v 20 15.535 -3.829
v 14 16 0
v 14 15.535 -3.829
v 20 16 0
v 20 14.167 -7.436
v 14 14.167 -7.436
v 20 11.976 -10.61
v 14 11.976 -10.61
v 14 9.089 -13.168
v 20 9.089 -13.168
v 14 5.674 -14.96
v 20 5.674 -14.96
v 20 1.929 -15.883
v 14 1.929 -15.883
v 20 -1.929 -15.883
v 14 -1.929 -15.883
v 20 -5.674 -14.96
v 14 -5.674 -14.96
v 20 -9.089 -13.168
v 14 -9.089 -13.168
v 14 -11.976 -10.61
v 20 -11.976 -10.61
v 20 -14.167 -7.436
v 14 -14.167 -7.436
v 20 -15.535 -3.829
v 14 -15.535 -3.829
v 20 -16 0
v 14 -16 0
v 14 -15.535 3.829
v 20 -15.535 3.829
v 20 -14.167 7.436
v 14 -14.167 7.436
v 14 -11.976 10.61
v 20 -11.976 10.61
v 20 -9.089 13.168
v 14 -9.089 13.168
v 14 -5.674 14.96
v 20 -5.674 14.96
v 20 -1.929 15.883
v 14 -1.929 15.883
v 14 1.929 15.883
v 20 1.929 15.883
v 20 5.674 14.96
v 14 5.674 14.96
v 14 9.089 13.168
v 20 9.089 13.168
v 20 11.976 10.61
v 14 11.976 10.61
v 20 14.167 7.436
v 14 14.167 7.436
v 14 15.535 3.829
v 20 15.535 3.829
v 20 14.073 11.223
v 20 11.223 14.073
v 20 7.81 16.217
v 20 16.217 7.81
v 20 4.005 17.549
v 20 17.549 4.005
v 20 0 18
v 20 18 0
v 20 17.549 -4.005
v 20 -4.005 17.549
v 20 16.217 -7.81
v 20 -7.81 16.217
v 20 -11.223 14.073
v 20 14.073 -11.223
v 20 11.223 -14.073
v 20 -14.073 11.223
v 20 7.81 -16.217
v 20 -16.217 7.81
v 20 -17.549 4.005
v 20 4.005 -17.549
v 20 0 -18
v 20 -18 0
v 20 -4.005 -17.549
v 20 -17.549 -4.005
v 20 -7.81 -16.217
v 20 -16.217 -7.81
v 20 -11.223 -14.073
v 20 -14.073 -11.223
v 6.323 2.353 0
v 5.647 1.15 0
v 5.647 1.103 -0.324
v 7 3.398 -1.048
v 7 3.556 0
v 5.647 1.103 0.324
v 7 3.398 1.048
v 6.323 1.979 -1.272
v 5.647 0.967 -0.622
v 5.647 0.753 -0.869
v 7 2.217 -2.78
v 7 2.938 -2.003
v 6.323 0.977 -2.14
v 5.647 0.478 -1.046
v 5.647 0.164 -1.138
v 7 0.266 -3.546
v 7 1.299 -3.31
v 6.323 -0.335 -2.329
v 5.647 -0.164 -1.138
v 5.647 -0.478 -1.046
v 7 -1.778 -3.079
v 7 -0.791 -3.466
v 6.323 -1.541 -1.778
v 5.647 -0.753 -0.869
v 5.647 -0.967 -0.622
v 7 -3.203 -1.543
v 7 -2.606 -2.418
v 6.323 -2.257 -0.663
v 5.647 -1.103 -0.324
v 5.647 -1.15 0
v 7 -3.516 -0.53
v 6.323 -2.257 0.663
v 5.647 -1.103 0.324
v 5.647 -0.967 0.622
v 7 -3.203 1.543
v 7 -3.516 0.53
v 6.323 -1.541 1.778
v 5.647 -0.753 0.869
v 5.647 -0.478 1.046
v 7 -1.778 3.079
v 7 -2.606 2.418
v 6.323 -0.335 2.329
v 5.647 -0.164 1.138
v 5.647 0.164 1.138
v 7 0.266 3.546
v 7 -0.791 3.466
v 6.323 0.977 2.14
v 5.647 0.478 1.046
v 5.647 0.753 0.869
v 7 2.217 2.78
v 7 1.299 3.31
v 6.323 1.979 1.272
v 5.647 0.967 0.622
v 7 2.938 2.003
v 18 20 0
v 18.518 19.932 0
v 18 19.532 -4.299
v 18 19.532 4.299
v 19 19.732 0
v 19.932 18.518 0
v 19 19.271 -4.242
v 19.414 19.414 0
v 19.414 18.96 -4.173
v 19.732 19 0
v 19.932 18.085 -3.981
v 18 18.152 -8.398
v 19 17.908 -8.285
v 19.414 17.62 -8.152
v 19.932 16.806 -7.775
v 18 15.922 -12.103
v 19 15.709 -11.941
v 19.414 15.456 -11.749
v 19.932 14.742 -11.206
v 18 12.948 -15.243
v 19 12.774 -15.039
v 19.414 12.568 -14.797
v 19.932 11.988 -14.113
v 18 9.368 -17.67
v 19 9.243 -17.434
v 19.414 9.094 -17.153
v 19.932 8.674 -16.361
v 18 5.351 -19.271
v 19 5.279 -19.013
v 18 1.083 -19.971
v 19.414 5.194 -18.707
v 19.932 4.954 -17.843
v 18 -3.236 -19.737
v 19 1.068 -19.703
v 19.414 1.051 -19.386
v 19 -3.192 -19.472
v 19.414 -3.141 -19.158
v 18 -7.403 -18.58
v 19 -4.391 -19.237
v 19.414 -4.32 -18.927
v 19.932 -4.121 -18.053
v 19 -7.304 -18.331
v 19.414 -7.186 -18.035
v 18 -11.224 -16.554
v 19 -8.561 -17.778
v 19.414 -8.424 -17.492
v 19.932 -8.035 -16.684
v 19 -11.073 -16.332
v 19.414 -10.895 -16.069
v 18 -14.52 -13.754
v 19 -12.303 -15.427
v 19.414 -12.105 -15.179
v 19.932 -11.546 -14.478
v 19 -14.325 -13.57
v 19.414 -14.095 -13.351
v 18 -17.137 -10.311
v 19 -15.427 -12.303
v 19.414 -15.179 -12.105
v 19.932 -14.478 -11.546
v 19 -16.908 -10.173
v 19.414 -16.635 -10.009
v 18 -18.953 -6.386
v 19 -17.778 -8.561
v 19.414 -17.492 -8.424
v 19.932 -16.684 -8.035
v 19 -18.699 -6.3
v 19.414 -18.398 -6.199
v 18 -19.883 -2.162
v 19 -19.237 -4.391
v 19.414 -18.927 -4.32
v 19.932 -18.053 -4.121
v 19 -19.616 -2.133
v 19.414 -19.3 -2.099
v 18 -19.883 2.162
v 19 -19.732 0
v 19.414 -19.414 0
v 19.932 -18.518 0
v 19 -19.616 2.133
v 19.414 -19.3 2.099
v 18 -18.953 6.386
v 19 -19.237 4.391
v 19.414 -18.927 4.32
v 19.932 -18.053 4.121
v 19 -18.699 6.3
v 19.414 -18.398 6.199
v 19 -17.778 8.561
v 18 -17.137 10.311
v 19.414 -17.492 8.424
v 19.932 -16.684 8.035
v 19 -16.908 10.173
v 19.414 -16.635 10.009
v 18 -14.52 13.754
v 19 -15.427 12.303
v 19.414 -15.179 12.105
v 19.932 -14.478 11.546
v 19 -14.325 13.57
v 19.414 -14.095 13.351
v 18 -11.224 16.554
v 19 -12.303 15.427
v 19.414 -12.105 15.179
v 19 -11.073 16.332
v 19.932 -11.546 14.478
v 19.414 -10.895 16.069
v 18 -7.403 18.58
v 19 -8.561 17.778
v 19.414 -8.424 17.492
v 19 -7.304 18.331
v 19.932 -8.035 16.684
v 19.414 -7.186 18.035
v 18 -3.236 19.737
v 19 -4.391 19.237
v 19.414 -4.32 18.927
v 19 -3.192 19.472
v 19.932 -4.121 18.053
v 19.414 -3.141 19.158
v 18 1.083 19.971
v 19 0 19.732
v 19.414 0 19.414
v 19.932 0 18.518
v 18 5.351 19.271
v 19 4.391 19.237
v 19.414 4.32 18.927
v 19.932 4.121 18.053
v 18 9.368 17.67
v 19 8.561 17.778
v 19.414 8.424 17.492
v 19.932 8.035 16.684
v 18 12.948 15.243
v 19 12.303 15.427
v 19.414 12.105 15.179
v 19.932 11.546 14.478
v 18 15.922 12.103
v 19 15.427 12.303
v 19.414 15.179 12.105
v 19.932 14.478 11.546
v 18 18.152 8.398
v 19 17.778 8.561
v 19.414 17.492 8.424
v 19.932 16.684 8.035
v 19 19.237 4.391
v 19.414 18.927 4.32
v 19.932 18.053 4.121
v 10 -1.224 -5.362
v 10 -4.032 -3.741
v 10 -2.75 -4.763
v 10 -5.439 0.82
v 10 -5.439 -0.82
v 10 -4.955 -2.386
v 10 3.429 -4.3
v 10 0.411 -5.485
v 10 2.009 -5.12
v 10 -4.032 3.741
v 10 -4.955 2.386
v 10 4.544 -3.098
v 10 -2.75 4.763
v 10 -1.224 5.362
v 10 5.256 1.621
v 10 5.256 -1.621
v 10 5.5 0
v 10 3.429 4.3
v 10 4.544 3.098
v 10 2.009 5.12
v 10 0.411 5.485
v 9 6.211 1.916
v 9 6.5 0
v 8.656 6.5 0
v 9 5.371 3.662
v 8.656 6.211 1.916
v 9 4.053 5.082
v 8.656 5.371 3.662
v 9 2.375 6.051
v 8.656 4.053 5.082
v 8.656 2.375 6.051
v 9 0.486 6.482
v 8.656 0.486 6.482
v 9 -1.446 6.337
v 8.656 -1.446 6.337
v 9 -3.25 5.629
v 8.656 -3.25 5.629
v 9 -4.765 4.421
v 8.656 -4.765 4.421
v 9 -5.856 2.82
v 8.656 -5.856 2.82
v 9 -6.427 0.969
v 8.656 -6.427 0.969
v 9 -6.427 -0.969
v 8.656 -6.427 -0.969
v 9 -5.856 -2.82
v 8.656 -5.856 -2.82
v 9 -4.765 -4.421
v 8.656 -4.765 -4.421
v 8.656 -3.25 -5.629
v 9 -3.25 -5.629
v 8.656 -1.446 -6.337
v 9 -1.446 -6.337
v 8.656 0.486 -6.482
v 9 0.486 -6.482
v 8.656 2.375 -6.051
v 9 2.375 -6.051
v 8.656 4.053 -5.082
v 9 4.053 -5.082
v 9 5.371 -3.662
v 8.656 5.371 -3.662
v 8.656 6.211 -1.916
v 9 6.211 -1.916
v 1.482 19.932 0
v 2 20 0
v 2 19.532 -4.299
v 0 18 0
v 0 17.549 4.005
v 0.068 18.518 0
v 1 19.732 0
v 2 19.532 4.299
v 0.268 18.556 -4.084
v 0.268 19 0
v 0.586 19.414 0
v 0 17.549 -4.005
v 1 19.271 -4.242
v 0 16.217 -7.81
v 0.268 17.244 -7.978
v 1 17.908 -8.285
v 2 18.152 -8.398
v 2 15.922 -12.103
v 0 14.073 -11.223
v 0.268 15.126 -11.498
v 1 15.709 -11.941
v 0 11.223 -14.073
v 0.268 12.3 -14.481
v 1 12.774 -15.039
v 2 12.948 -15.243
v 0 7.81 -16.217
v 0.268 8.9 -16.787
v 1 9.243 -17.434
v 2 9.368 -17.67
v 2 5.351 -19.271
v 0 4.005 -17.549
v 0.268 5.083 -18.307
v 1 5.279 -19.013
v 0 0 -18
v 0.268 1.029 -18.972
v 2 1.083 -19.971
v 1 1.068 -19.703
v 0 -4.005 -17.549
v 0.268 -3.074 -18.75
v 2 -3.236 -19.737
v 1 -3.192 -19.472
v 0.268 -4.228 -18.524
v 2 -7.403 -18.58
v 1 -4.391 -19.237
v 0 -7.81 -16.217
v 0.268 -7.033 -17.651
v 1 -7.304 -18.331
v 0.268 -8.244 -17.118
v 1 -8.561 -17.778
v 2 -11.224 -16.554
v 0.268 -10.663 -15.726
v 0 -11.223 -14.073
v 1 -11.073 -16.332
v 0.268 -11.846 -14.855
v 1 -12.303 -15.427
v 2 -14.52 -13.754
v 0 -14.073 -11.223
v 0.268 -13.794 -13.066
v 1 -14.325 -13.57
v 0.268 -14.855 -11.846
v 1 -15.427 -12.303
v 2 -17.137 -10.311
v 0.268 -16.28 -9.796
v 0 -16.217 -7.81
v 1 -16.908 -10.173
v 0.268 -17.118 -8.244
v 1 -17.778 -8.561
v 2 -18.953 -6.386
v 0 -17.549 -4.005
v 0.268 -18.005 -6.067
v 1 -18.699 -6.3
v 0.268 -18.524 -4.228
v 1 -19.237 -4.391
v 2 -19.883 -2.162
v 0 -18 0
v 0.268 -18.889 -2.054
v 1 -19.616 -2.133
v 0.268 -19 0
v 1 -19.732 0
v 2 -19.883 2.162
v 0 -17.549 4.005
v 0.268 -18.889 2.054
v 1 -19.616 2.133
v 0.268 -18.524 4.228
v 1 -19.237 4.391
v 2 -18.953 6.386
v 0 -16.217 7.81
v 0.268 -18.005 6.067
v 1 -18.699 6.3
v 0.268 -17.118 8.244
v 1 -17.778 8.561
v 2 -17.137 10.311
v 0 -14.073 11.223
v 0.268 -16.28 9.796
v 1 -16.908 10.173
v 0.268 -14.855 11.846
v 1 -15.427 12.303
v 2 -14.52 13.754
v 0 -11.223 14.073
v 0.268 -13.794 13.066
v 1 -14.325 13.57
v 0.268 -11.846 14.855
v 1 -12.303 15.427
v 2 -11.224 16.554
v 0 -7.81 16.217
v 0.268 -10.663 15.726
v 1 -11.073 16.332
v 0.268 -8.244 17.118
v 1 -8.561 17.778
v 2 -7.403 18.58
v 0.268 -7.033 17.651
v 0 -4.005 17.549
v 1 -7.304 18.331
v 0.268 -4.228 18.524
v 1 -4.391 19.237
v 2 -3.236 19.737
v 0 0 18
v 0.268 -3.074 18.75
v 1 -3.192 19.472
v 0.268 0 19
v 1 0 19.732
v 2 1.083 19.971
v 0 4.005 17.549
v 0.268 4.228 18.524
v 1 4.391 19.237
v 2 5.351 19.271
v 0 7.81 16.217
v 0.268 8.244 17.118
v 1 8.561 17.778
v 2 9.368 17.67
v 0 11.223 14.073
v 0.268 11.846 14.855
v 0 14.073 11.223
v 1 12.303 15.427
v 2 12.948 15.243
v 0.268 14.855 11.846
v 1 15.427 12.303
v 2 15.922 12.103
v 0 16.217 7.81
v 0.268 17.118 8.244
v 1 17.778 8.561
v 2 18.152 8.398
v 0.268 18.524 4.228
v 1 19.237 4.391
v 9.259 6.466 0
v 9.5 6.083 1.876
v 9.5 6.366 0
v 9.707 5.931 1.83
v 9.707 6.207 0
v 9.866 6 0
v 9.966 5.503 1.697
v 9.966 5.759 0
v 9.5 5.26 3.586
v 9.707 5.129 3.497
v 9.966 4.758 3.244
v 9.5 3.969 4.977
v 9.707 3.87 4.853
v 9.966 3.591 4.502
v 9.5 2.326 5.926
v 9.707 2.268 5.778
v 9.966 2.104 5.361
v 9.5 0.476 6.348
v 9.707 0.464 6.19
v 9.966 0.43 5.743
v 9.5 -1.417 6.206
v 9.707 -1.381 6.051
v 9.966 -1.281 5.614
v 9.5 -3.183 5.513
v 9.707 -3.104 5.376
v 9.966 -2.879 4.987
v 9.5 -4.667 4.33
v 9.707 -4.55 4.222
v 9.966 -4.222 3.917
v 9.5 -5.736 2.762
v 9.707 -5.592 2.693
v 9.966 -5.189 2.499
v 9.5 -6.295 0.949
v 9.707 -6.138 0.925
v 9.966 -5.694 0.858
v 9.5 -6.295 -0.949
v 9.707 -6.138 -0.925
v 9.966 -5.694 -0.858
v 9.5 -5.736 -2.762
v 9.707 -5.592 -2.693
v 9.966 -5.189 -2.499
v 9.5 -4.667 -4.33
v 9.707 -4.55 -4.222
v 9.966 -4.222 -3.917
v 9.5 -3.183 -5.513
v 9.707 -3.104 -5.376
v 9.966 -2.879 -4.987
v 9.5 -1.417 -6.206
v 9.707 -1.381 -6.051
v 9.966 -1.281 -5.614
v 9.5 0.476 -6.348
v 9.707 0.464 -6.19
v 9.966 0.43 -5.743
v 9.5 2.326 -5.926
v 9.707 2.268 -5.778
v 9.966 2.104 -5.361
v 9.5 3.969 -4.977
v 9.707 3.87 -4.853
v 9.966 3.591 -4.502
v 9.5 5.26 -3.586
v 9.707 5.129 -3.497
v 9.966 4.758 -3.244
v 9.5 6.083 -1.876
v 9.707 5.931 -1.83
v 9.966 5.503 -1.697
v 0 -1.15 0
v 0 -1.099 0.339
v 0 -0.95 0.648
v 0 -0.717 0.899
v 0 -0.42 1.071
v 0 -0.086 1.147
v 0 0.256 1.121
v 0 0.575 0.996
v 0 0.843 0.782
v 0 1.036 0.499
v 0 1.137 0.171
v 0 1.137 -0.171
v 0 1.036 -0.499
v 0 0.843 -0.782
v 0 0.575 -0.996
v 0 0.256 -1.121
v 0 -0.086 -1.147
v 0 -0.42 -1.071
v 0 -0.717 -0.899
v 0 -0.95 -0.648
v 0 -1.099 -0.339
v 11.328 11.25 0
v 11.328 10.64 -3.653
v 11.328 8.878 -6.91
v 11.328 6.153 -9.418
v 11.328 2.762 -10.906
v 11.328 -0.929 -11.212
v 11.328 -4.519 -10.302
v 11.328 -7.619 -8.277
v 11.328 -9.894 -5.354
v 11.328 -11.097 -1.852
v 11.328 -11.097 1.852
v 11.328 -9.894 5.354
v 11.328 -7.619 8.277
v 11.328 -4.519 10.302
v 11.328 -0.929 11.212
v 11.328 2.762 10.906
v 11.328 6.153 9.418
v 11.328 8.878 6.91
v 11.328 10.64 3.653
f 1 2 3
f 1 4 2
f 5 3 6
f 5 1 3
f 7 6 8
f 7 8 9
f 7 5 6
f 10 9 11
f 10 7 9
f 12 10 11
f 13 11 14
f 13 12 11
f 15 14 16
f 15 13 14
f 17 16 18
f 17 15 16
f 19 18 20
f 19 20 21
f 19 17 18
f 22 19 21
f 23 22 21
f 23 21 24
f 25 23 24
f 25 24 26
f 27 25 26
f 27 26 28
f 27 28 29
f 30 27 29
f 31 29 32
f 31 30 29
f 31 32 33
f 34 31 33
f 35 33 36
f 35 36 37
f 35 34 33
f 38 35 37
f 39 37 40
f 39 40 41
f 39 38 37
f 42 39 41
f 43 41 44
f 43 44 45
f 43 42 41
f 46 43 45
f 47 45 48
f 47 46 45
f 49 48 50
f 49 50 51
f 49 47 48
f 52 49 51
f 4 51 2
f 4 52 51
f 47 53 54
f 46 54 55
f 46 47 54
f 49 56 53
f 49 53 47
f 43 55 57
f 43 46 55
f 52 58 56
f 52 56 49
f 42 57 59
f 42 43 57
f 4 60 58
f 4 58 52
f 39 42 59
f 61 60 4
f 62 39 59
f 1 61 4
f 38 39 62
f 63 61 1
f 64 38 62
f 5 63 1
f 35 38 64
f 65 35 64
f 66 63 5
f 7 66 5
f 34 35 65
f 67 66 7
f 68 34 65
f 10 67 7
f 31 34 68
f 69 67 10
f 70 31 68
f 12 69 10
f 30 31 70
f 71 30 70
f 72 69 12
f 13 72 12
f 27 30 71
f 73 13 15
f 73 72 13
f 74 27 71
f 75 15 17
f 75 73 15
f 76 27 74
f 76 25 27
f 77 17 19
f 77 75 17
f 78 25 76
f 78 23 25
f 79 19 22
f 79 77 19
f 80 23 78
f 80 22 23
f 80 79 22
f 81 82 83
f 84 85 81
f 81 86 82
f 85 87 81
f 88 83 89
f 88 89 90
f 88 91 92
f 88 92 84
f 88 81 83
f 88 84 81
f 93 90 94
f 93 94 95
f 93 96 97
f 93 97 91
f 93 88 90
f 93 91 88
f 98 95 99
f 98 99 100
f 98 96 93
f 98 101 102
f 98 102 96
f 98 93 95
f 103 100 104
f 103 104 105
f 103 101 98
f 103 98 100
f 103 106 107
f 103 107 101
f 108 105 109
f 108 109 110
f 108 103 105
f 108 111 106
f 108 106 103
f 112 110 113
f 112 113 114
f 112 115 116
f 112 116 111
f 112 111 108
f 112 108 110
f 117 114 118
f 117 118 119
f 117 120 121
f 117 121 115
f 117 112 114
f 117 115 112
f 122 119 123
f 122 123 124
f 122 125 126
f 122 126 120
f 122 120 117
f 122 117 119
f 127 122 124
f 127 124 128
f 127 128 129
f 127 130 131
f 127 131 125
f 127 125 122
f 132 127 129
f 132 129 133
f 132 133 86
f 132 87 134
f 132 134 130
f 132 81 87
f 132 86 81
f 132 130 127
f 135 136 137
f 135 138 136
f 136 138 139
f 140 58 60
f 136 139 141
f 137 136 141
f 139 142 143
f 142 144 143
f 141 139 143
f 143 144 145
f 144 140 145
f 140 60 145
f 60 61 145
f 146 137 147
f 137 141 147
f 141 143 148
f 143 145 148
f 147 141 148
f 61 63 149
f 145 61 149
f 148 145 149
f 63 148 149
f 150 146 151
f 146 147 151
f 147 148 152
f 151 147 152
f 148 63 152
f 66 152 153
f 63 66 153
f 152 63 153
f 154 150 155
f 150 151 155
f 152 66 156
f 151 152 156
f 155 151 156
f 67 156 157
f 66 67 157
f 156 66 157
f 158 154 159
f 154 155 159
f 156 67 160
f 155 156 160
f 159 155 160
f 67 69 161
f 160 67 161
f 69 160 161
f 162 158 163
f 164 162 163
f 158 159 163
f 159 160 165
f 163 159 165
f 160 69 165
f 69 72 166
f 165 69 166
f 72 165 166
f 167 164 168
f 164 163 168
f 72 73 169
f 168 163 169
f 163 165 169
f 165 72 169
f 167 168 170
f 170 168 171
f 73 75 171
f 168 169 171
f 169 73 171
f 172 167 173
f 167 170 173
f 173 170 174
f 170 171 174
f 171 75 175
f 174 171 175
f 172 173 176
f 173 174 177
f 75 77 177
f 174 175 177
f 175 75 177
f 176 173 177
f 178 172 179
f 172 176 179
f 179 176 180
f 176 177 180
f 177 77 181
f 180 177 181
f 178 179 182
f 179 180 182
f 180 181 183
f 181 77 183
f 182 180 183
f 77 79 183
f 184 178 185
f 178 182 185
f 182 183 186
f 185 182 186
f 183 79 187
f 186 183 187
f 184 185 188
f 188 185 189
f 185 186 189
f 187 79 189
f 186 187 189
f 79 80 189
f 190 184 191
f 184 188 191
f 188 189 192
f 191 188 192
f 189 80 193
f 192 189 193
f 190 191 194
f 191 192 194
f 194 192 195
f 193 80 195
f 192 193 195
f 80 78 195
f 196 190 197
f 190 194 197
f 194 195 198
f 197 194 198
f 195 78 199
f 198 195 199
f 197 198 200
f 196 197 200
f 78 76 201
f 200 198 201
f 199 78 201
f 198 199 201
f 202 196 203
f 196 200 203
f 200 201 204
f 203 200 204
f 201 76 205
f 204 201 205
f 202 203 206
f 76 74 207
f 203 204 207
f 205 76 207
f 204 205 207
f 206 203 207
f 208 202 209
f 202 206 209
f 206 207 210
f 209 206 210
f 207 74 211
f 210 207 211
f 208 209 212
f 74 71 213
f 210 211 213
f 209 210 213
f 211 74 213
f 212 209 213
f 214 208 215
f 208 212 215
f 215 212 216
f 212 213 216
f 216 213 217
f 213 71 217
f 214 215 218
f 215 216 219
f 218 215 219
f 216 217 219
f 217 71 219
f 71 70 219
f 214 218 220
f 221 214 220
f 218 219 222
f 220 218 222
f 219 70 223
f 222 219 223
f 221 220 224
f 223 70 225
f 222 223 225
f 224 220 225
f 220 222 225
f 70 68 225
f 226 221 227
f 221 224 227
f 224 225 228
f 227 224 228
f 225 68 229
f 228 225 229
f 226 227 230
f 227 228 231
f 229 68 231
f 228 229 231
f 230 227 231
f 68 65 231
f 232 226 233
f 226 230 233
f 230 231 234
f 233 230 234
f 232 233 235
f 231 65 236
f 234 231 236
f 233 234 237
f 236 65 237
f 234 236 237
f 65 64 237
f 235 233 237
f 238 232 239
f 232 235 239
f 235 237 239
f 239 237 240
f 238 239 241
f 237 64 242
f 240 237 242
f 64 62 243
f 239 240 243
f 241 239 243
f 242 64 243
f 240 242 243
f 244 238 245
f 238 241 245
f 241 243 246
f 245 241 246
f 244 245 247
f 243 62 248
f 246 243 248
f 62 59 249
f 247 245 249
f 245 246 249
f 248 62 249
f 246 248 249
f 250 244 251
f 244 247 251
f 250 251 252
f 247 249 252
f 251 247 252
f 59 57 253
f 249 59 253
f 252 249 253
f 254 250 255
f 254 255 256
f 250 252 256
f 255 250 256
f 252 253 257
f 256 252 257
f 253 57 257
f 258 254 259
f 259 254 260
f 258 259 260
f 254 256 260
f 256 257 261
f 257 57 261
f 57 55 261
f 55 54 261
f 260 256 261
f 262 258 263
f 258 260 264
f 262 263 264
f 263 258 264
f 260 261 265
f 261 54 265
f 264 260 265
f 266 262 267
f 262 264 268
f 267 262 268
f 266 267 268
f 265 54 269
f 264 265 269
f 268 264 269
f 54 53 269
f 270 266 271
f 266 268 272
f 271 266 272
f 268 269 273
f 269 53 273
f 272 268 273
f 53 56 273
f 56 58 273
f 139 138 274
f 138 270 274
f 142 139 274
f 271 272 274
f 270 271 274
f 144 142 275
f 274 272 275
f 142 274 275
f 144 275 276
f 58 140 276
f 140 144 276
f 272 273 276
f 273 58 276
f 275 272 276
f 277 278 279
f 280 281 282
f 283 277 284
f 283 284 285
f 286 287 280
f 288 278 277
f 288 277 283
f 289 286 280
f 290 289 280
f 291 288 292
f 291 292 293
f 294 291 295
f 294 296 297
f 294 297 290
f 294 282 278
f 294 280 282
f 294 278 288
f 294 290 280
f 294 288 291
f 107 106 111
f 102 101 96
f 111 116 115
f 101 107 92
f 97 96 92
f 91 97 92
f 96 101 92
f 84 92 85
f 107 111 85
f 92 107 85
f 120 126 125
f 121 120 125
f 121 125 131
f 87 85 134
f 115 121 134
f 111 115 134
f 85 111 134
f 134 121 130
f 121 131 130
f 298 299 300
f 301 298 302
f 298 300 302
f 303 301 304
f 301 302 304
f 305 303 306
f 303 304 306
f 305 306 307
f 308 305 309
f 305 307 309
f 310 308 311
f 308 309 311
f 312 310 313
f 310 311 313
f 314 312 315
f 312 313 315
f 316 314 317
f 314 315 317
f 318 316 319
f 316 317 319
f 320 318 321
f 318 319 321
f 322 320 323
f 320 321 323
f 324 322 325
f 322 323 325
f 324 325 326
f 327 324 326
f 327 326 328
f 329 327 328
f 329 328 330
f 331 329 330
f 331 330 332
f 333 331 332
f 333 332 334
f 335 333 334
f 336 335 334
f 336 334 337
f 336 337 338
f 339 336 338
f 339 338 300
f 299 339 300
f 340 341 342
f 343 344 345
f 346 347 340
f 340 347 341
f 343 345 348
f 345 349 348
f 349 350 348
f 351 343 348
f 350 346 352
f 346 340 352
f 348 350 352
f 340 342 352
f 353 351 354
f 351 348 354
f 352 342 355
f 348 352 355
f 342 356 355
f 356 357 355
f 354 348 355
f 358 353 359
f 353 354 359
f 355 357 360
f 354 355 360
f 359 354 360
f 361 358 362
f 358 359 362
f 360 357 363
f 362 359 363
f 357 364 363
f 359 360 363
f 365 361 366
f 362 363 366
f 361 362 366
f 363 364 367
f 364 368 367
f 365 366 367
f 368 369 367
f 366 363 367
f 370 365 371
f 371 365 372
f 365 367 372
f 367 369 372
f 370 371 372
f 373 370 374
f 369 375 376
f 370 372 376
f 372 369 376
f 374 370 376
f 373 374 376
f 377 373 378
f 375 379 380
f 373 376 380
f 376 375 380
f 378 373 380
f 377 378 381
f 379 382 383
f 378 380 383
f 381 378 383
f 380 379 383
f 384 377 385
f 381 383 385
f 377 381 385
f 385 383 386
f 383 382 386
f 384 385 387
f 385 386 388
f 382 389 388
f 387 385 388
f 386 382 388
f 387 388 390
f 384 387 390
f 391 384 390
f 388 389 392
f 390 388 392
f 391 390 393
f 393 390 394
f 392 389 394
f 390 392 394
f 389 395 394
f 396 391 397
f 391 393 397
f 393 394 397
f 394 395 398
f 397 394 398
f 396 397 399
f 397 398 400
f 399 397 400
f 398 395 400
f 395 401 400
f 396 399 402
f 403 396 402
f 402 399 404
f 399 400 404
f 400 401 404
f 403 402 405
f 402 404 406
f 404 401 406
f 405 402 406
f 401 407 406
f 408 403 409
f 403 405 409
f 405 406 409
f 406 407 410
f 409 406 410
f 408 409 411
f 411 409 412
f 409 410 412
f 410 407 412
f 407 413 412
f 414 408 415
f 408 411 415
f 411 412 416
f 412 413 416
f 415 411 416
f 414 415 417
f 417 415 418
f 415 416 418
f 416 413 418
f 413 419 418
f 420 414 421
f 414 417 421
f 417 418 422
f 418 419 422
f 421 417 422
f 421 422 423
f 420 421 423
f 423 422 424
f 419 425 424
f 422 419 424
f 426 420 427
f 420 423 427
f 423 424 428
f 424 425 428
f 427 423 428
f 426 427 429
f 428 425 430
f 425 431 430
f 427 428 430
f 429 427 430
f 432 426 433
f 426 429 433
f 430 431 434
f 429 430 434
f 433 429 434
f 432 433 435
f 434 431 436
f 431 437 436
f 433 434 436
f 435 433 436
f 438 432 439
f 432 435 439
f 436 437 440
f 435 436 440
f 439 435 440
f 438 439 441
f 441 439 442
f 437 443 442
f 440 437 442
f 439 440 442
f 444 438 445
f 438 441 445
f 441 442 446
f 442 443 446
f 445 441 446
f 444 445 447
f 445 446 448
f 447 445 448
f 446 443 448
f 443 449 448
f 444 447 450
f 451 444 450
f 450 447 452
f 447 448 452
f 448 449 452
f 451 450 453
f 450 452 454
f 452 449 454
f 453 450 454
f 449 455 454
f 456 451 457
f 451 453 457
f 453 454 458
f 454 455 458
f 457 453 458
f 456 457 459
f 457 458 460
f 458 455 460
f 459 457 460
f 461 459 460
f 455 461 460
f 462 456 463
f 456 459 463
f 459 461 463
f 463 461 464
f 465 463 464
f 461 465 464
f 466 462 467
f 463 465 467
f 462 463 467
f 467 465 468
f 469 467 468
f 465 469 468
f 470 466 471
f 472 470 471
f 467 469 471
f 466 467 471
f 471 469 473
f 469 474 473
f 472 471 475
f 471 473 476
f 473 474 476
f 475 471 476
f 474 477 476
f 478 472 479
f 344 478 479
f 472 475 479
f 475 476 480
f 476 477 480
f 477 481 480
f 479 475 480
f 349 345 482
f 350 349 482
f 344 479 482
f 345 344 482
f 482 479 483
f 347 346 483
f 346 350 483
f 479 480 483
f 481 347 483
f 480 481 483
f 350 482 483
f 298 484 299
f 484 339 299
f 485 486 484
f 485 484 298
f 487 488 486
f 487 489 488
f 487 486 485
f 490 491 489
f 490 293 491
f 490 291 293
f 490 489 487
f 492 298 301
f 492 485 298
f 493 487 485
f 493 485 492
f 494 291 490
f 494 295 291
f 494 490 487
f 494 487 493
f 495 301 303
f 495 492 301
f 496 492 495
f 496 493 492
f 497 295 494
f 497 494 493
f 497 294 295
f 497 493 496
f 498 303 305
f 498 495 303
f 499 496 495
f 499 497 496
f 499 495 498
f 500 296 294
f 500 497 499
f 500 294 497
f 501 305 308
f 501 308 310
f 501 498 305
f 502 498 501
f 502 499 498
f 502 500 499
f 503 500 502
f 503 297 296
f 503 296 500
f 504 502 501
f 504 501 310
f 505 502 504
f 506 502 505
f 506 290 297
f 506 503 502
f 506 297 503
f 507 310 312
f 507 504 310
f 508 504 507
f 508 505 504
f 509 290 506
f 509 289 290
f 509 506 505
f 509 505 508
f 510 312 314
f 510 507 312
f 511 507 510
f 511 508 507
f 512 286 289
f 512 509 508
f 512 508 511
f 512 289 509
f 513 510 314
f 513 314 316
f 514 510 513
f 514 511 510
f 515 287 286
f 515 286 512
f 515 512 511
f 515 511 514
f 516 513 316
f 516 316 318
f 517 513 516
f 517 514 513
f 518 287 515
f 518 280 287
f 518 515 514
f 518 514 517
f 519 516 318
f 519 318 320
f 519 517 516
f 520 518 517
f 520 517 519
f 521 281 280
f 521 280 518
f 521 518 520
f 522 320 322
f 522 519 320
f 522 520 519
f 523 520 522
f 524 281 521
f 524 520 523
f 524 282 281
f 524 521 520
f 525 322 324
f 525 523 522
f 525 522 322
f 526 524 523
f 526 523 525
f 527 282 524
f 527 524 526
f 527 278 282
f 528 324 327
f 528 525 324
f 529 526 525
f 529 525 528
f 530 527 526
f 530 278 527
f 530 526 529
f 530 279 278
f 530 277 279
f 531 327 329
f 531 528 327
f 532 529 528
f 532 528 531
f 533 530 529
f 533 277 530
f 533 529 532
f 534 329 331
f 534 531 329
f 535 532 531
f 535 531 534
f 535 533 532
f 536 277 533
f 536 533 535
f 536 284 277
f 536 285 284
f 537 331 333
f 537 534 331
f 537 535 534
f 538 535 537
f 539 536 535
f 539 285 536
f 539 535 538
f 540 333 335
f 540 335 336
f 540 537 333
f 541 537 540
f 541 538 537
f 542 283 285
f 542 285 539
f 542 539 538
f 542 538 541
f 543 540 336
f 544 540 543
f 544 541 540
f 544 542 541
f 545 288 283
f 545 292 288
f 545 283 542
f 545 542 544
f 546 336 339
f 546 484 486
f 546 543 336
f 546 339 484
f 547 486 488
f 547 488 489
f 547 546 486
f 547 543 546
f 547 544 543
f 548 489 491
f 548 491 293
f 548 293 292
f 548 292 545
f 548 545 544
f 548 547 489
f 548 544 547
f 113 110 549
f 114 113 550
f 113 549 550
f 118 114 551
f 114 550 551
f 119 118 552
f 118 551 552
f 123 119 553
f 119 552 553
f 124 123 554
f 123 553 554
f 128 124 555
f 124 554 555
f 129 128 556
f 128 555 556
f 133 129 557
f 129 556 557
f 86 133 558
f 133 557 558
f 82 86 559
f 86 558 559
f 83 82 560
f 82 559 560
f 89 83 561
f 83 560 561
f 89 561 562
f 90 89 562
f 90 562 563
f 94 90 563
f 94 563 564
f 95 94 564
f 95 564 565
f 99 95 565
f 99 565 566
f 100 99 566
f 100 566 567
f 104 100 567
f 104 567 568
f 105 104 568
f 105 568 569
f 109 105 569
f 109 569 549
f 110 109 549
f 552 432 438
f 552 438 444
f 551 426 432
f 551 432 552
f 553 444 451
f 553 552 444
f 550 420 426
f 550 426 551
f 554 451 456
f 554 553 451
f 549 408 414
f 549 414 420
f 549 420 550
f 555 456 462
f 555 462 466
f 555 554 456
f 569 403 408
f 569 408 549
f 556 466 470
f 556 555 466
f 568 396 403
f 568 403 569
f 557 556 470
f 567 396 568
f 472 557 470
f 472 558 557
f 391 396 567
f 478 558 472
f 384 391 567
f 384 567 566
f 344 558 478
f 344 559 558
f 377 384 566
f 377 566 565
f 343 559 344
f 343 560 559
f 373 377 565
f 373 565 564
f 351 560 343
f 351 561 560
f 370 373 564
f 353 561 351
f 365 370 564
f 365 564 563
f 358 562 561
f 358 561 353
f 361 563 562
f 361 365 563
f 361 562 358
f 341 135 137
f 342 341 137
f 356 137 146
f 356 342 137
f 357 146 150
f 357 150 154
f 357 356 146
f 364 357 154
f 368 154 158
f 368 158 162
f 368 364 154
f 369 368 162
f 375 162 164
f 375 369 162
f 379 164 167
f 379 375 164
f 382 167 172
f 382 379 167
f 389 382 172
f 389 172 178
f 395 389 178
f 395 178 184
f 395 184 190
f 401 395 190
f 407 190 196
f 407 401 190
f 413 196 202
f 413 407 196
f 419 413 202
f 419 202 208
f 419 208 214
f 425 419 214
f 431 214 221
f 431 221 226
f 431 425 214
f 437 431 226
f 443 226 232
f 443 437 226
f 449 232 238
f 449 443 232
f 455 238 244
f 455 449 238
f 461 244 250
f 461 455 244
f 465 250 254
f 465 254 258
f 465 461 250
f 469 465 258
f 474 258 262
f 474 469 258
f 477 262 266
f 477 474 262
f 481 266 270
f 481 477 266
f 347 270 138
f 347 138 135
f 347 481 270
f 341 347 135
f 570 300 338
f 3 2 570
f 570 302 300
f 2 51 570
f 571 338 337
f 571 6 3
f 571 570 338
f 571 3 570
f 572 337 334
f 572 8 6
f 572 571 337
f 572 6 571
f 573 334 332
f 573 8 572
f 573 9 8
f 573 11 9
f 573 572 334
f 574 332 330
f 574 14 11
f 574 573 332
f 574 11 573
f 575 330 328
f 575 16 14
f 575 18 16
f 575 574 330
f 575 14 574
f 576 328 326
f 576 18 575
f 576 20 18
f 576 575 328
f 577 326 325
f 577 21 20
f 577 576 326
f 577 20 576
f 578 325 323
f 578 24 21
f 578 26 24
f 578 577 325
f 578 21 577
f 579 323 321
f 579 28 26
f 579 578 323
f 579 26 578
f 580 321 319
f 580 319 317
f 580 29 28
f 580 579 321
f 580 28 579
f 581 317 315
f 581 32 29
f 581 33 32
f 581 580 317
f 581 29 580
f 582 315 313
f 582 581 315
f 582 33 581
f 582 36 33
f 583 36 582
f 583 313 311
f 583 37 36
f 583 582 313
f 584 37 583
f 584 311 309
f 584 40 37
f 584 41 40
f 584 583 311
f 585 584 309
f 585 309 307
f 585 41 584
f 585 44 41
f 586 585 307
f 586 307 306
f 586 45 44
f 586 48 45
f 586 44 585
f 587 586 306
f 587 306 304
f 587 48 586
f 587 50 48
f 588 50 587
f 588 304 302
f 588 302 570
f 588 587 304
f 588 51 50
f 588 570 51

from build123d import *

# Parameters (mm, degrees)
F2_R     = 1.15
F3_DEPTH = 25
F4_R     = 2
F7_R     = 6.5
F7_R_2   = 1.15
F8_DEPTH = 3
F9_R     = 1


with BuildPart() as f1:
    # F0 (on Top) → F1 (revolve)
    with BuildSketch(Plane.XY):
        Polygon((0, 20), (0, 0), (5, 0), (14, 16), (20, 16), (20, 20), align=None)
    revolve(axis=Axis((2.5, 0, 0), (-1, 0, 0)))

    # F2 (on face) → F3 (cut)
    with BuildSketch(Plane(origin=(0, 0, 0), x_dir=(0, -1, 0), z_dir=(-1, 0, 0))):
        Circle(F2_R)
    extrude(amount=-F3_DEPTH, mode=Mode.SUBTRACT)

    # F4
    f4_edges = [f1.edges().sort_by_distance(p)[0] for p in [
        (20, -20, 0),
        (0, -20, 0),
    ]]
    fillet(f4_edges, radius=F4_R)

    # F7 (on offset) → F8 (join)
    with BuildSketch(Plane.YZ.offset(7)):
        Circle(F7_R)
        Circle(F7_R_2, mode=Mode.SUBTRACT)
        Circle(F7_R_2)
    extrude(amount=F8_DEPTH)

    # F9
    f9_edges = [f1.edges().sort_by_distance(p)[0] for p in [
        (10, -6.5, 0),
    ]]
    fillet(f9_edges, radius=F9_R)


solid = f1.part
